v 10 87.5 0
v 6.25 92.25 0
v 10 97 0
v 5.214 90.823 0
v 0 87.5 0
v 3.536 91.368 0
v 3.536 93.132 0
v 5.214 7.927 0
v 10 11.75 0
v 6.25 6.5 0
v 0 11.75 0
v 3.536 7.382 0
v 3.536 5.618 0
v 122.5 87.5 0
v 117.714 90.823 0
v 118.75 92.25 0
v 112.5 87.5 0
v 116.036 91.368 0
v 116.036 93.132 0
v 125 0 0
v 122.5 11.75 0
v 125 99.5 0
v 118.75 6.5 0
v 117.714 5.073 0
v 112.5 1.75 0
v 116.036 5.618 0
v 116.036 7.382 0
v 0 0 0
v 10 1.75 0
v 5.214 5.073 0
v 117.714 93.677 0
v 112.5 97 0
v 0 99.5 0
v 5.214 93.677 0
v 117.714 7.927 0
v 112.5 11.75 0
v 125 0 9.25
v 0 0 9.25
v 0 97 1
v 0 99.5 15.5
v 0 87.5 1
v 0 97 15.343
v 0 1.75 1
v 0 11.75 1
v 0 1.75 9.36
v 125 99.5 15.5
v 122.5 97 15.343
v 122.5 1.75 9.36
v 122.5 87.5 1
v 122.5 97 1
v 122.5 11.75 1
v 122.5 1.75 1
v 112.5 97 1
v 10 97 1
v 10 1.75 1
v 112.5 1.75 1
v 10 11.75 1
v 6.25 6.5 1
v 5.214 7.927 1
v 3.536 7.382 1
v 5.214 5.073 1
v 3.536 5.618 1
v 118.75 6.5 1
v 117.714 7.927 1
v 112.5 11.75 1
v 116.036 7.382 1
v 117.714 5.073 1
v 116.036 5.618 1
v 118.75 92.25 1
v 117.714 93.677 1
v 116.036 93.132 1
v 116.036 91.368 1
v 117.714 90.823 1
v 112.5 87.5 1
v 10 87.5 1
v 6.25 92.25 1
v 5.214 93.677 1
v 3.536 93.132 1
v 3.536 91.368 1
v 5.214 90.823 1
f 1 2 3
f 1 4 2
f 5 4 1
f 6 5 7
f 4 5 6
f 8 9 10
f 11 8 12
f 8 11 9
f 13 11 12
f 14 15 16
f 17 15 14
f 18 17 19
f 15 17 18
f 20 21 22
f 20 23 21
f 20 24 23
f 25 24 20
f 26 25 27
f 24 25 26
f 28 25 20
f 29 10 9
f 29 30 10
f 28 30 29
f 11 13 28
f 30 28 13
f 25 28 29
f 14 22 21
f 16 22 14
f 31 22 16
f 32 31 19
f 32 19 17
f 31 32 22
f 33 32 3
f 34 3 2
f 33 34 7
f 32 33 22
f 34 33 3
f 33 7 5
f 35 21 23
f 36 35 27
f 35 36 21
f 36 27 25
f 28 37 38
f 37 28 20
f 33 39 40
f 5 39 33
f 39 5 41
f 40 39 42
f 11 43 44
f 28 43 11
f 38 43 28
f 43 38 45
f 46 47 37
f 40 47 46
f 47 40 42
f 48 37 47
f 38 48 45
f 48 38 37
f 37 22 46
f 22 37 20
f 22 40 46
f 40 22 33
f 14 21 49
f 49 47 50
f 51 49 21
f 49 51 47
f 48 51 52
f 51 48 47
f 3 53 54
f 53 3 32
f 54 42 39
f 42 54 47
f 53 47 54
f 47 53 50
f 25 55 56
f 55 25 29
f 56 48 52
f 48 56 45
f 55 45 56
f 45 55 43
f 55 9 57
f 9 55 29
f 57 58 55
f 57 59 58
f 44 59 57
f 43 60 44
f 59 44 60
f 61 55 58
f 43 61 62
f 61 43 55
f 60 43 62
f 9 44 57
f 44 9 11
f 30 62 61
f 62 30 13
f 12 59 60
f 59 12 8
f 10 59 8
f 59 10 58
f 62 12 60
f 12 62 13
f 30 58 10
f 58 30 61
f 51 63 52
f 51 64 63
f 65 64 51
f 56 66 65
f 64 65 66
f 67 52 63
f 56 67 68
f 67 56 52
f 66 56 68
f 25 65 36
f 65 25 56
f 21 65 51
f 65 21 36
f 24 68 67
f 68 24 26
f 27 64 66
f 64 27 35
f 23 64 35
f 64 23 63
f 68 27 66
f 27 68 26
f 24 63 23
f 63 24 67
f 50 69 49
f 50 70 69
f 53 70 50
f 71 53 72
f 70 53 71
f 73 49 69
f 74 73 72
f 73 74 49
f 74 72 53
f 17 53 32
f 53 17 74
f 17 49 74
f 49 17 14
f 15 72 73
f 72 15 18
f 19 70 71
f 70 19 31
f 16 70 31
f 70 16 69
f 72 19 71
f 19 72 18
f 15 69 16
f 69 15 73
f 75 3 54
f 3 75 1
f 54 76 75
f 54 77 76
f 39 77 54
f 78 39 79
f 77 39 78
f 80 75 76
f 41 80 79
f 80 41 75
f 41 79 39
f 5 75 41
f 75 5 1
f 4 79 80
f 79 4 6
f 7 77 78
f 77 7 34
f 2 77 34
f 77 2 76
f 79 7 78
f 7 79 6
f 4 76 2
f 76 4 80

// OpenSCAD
// Create the rightmost component of a mechanical keyboard case

// Define the outermost points of the casing
wallPoints = [
    [0,0,0],
    [125,0,0],
    [125,99.5,0],
    [0,99.5,0],
    [0,0,9.25],
    [125,0,9.25],
    [125,99.5,15.5],
    [0,99.5,15.5]
];

// Define a 2D array containing the point ordering to create the facade of the case
wallFaces = [
  [0,1,2,3],  // bottom
  [4,5,1,0],  // front
  [7,6,5,4],  // top
  [5,6,2,1],  // right
  [6,7,3,2],  // back
  [7,4,0,3]   // left
];

/* Create the right hand side of the casing
 *
 * Take the difference of the polyhedron the makes up the case with a cube smaller 
 * than the polyhedron with an offset of 2.5mm on the X & Y axes  
 */
difference() {
    polyhedron(wallPoints, wallFaces);
    translate([0,1.75,0]) {
        cube([122.5,95.25,16]);
    }
}

// Define constants used for supports that will attach the case to the frame
raftSideLength = 10;
raftHeight = 1;
raftScrewHoleRadius = 1.5;
screwHoleOffset = 4.75;

// Create four rafts (one in each corner) that will be used to secure this part to the steel plate
translate([0,1.75,0]) {
    difference() {
        cube([raftSideLength,raftSideLength,raftHeight]);
        translate([screwHoleOffset,screwHoleOffset,0]) {
            cylinder(h=raftHeight, r=raftScrewHoleRadius);
        }
    }
}

translate([112.5,1.75,0]) {
    difference() {
        cube([raftSideLength,raftSideLength,raftHeight]);
        translate([screwHoleOffset,screwHoleOffset,0]) {
            cylinder(h=raftHeight, r=raftScrewHoleRadius);
        }
    }
}
translate([112.5,87.5,0]) {
    difference() {
        cube([raftSideLength,raftSideLength,raftHeight]);
        translate([screwHoleOffset,screwHoleOffset,0]) {
            cylinder(h=raftHeight, r=raftScrewHoleRadius);
        }
    }
}

translate([0,87.5,0]) {
    difference() {
        cube([raftSideLength,raftSideLength,raftHeight]);
        translate([screwHoleOffset,screwHoleOffset,0]) {
            cylinder(h=raftHeight, r=raftScrewHoleRadius);
        }
    }
}
